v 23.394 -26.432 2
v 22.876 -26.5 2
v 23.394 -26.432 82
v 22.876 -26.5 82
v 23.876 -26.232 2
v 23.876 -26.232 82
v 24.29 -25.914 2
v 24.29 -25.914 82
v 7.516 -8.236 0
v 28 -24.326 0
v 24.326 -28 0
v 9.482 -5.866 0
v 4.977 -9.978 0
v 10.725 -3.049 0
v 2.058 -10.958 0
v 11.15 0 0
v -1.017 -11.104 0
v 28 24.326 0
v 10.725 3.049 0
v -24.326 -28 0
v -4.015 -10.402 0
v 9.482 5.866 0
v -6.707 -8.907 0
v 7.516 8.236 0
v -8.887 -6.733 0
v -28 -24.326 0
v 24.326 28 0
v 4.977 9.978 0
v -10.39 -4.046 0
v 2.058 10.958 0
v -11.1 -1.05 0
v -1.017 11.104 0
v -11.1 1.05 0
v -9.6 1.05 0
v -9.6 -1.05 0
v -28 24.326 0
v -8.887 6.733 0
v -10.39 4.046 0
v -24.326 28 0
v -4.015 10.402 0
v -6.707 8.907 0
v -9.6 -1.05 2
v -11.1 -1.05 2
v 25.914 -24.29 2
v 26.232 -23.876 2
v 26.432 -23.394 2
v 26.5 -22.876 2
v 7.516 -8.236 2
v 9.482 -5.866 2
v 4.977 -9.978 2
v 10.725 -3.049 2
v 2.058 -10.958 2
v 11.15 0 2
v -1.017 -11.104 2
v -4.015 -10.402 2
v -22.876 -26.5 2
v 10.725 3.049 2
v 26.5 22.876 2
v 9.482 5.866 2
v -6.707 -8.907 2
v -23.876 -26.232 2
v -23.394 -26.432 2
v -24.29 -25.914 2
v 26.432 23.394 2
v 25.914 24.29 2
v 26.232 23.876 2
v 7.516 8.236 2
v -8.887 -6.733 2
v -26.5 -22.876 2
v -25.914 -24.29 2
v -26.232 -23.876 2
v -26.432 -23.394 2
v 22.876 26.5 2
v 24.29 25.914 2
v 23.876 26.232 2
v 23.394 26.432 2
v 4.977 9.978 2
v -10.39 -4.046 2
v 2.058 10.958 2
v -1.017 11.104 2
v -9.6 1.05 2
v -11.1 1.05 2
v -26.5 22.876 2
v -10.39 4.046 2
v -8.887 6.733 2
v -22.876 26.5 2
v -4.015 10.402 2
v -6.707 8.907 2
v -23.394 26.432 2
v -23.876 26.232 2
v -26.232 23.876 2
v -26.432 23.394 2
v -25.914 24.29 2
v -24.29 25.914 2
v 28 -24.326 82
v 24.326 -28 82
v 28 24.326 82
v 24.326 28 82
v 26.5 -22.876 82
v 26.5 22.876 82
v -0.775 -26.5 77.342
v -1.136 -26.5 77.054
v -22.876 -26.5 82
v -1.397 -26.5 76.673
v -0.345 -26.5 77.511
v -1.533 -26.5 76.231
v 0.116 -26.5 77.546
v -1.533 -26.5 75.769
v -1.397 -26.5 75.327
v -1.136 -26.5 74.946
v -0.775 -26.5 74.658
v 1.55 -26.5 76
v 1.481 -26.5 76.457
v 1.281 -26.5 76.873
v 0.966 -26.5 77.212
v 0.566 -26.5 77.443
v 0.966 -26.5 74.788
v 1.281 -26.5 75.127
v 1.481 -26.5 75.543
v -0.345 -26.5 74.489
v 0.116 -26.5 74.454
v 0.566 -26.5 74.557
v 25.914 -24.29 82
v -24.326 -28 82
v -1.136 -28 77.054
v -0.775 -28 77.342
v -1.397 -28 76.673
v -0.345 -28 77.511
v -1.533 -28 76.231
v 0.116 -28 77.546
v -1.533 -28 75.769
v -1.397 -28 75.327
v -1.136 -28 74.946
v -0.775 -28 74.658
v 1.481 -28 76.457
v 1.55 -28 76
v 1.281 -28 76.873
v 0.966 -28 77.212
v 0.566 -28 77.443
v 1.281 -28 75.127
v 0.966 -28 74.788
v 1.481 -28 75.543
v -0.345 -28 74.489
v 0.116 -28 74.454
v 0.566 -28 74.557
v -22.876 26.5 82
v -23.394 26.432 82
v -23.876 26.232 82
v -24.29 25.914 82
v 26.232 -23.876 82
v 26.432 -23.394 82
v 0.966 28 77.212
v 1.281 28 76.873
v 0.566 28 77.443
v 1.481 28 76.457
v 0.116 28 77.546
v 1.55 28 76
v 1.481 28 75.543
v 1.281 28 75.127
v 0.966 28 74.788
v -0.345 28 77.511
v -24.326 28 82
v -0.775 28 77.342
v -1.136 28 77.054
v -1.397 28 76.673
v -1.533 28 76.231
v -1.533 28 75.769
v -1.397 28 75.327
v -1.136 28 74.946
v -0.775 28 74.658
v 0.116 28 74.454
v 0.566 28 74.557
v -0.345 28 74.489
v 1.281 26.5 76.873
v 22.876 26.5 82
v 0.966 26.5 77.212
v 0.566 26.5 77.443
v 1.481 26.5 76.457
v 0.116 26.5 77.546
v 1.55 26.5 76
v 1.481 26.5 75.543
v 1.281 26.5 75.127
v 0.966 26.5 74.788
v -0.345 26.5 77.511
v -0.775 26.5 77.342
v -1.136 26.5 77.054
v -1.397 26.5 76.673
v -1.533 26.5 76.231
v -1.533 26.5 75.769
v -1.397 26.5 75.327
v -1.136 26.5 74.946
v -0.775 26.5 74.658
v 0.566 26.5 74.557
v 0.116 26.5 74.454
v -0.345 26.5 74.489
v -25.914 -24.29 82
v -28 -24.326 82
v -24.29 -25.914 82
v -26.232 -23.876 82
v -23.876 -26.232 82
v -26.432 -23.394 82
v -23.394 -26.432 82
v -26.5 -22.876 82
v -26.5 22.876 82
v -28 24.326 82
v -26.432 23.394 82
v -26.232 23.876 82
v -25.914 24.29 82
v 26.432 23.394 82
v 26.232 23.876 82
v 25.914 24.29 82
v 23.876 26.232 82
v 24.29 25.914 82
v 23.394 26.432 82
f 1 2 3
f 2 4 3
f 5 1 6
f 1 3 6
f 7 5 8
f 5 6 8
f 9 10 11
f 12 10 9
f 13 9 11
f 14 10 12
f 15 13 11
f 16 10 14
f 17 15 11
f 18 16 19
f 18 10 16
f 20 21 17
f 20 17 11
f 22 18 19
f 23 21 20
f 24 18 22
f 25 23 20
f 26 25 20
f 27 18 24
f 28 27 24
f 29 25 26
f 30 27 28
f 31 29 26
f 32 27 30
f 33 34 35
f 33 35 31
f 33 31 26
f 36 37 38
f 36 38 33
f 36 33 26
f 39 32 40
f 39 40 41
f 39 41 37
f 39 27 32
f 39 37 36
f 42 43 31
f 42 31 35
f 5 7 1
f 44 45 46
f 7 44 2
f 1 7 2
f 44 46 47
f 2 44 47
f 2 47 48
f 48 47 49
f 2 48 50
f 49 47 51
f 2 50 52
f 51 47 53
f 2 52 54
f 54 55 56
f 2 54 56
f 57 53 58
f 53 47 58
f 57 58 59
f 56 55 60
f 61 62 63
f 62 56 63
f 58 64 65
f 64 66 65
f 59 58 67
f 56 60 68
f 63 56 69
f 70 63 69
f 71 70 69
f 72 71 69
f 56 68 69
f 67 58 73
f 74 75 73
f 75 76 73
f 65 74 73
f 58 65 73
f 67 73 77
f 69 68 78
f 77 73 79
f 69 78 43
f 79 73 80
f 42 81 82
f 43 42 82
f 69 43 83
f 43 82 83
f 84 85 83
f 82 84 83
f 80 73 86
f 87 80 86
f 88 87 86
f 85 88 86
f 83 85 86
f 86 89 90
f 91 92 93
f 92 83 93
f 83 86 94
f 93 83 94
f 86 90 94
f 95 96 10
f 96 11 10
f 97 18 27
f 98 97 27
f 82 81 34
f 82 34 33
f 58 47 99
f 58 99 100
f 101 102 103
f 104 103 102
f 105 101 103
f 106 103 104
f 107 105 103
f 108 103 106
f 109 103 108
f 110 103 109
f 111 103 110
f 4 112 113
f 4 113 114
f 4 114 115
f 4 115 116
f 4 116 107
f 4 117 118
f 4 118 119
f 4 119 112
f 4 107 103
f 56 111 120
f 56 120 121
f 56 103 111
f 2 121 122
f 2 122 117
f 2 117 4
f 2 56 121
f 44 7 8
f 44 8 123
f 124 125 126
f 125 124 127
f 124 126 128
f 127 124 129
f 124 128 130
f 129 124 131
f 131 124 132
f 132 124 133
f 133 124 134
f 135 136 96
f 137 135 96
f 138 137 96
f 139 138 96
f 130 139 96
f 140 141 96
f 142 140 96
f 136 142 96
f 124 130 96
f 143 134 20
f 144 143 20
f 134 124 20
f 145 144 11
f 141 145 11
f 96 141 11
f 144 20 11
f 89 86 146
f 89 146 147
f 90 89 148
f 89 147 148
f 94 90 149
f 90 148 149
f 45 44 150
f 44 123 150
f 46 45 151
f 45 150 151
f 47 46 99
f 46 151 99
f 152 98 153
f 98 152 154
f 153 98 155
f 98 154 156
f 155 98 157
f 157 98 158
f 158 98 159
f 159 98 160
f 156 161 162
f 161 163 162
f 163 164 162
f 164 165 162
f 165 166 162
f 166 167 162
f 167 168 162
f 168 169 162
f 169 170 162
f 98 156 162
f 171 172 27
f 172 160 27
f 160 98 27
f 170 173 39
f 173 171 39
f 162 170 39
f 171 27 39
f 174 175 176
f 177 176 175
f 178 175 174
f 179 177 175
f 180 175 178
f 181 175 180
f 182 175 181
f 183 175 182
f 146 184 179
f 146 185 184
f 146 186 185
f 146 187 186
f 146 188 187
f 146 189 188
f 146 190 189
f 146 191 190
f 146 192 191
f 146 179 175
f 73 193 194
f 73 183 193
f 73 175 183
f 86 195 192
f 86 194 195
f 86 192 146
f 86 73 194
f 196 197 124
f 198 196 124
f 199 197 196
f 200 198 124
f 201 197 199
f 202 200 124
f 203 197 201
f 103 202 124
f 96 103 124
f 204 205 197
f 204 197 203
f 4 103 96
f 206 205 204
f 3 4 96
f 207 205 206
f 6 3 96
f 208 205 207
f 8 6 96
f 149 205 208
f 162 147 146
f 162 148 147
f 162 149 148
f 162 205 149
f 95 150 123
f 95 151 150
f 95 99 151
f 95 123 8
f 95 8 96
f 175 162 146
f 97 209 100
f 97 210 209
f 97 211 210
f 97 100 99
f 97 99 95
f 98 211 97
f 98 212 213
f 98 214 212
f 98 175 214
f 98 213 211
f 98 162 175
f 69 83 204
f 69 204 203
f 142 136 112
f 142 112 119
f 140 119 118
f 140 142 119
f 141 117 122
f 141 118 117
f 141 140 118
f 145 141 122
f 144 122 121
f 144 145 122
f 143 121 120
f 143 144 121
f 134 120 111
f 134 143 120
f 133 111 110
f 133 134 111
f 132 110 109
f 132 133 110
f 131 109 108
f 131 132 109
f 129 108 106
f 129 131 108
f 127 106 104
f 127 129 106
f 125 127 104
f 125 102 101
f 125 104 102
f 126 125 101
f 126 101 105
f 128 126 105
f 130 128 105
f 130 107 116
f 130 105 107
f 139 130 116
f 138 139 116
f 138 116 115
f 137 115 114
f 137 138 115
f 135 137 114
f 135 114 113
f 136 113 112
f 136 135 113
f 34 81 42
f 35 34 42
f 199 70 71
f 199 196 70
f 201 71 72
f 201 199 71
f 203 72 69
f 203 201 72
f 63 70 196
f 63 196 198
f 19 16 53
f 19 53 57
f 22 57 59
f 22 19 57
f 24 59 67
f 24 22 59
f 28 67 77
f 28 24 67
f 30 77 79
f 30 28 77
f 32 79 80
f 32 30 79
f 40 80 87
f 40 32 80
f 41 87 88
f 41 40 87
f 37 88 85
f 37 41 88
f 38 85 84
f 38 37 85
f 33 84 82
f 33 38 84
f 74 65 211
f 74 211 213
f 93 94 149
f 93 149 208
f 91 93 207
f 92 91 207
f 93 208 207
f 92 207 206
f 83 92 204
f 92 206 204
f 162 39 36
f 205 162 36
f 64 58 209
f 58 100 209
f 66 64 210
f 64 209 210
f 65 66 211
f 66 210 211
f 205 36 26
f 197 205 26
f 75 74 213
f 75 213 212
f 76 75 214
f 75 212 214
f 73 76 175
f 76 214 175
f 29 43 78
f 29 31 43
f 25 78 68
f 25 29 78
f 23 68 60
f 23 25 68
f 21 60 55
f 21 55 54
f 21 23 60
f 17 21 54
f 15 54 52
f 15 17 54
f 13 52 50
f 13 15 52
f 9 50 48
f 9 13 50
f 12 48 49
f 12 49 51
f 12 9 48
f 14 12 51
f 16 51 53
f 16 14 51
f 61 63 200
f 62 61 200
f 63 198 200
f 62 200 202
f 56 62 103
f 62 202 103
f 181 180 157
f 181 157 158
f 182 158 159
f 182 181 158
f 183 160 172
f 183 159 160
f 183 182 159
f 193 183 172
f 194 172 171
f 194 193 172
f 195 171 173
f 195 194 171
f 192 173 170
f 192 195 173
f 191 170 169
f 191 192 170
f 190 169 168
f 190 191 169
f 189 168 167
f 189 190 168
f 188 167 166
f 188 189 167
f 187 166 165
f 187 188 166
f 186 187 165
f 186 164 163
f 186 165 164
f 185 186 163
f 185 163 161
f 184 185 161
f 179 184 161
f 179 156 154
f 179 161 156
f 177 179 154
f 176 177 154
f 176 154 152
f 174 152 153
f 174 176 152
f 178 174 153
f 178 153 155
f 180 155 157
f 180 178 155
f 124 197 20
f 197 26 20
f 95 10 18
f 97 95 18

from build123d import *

# Parameters (mm, degrees)
ESQUISSE1_R                  = 11.15
BOSS_EXTRU_1_DEPTH           = 2
BOSS_EXTRU_2_DEPTH           = 80
BOSS_EXTRU_3_DEPTH           = 2.3
ENL_V_MAT_EXTRU_1_DEPTH      = 106.452595985
ENL_V_MAT_EXTRU_1_DEPTH_BACK = 106.452595985
ESQUISSE4_R                  = 1.55
BOSS_EXTRU_4_DEPTH           = 2
ENL_V_MAT_EXTRU_2_DEPTH      = 10
CONG_1_R                     = 2


with BuildPart() as part:
    # Esquisse1 → Boss.-Extru.1 (new body)
    with BuildSketch(Plane.XY):
        Polygon((-24.325901808, 28), (24.325901808, 28), (28, 24.325901808), (28, -24.325901808), (24.325901808, -28), (-24.325901808, -28), (-28, -24.325901808), (-28, 24.325901808), align=None)
        Circle(ESQUISSE1_R, mode=Mode.SUBTRACT)
    extrude(amount=BOSS_EXTRU_1_DEPTH)

    # Esquisse2 → Boss.-Extru.2 (add)
    with BuildSketch(Plane.XY.offset(2)):
        Polygon((-28, 24.325901808), (-28, -24.325901808), (-24.325901808, -28), (24.325901808, -28), (28, -24.325901808), (28, 24.325901808), (24.325901808, 28), (-24.325901808, 28), align=None)
        Polygon((-26.5, 23.704581464), (-26.5, -23.704581464), (-23.704581464, -26.5), (23.704581464, -26.5), (26.5, -23.704581464), (26.5, 23.704581464), (23.704581464, 26.5), (-23.704581464, 26.5), align=None, mode=Mode.SUBTRACT)
    extrude(amount=BOSS_EXTRU_2_DEPTH)

    # Esquisse3 → Boss.-Extru.3 (add)
    with BuildSketch(Plane(origin=(0, 0, 0), x_dir=(-1, 0, 0), z_dir=(0, 0, -1))):
        Polygon((-28, -20), (-28, 20), (-35.5, 12.5), (-35.5, -12.5), align=None)
        Polygon((-31.75, 3.175426481), (-34.5, 1.58771324), (-34.5, -1.58771324), (-31.75, -3.175426481), (-29, -1.58771324), (-29, 1.58771324), align=None, mode=Mode.SUBTRACT)
    extrude(amount=-BOSS_EXTRU_3_DEPTH)

    # Esquisse4 → Enlèv. mat.-Extru.1 (cut, two sides: drawn at the far end of the back side and taken through both)
    with BuildSketch(Plane(origin=(0, 28, 0), x_dir=(1, 0, 0), z_dir=(0, 1, 0)).offset(-ENL_V_MAT_EXTRU_1_DEPTH_BACK)):
        with Locations((0, -76)):
            Circle(ESQUISSE4_R)
    extrude(amount=ENL_V_MAT_EXTRU_1_DEPTH + ENL_V_MAT_EXTRU_1_DEPTH_BACK, mode=Mode.SUBTRACT)

    # Esquisse5 → Boss.-Extru.4 (add)
    with BuildSketch(Plane.XY.offset(2)):
        Polygon((-10.828088474, -1.05), (-12.1, -1.05), (-12.1, 1.05), (-10.828088474, 1.05), (-9.6, 1.05), (-9.6, -1.05), align=None)
    extrude(amount=-BOSS_EXTRU_4_DEPTH)

    # Esquisse6 → Enlèv. mat.-Extru.2 (cut)
    with BuildSketch(Plane.XY.offset(2.3)):
        Polygon((28, -20), (35.5, -12.5), (35.5, 12.5), (28, 20), align=None)
    extrude(amount=-ENL_V_MAT_EXTRU_2_DEPTH, mode=Mode.SUBTRACT)

    # Congé1
    cong_1_edges = [part.edges().sort_by_distance(p)[0] for p in [
        (-23.704581464, -26.5, 42),
        (23.704581464, -26.5, 42),
        (26.5, -23.704581464, 42),
        (26.5, 23.704581464, 42),
        (23.704581464, 26.5, 42),
        (-23.704581464, 26.5, 42),
        (-26.5, 23.704581464, 42),
        (-26.5, -23.704581464, 42),
    ]]
    fillet(cong_1_edges, radius=CONG_1_R)


solid = part.part
